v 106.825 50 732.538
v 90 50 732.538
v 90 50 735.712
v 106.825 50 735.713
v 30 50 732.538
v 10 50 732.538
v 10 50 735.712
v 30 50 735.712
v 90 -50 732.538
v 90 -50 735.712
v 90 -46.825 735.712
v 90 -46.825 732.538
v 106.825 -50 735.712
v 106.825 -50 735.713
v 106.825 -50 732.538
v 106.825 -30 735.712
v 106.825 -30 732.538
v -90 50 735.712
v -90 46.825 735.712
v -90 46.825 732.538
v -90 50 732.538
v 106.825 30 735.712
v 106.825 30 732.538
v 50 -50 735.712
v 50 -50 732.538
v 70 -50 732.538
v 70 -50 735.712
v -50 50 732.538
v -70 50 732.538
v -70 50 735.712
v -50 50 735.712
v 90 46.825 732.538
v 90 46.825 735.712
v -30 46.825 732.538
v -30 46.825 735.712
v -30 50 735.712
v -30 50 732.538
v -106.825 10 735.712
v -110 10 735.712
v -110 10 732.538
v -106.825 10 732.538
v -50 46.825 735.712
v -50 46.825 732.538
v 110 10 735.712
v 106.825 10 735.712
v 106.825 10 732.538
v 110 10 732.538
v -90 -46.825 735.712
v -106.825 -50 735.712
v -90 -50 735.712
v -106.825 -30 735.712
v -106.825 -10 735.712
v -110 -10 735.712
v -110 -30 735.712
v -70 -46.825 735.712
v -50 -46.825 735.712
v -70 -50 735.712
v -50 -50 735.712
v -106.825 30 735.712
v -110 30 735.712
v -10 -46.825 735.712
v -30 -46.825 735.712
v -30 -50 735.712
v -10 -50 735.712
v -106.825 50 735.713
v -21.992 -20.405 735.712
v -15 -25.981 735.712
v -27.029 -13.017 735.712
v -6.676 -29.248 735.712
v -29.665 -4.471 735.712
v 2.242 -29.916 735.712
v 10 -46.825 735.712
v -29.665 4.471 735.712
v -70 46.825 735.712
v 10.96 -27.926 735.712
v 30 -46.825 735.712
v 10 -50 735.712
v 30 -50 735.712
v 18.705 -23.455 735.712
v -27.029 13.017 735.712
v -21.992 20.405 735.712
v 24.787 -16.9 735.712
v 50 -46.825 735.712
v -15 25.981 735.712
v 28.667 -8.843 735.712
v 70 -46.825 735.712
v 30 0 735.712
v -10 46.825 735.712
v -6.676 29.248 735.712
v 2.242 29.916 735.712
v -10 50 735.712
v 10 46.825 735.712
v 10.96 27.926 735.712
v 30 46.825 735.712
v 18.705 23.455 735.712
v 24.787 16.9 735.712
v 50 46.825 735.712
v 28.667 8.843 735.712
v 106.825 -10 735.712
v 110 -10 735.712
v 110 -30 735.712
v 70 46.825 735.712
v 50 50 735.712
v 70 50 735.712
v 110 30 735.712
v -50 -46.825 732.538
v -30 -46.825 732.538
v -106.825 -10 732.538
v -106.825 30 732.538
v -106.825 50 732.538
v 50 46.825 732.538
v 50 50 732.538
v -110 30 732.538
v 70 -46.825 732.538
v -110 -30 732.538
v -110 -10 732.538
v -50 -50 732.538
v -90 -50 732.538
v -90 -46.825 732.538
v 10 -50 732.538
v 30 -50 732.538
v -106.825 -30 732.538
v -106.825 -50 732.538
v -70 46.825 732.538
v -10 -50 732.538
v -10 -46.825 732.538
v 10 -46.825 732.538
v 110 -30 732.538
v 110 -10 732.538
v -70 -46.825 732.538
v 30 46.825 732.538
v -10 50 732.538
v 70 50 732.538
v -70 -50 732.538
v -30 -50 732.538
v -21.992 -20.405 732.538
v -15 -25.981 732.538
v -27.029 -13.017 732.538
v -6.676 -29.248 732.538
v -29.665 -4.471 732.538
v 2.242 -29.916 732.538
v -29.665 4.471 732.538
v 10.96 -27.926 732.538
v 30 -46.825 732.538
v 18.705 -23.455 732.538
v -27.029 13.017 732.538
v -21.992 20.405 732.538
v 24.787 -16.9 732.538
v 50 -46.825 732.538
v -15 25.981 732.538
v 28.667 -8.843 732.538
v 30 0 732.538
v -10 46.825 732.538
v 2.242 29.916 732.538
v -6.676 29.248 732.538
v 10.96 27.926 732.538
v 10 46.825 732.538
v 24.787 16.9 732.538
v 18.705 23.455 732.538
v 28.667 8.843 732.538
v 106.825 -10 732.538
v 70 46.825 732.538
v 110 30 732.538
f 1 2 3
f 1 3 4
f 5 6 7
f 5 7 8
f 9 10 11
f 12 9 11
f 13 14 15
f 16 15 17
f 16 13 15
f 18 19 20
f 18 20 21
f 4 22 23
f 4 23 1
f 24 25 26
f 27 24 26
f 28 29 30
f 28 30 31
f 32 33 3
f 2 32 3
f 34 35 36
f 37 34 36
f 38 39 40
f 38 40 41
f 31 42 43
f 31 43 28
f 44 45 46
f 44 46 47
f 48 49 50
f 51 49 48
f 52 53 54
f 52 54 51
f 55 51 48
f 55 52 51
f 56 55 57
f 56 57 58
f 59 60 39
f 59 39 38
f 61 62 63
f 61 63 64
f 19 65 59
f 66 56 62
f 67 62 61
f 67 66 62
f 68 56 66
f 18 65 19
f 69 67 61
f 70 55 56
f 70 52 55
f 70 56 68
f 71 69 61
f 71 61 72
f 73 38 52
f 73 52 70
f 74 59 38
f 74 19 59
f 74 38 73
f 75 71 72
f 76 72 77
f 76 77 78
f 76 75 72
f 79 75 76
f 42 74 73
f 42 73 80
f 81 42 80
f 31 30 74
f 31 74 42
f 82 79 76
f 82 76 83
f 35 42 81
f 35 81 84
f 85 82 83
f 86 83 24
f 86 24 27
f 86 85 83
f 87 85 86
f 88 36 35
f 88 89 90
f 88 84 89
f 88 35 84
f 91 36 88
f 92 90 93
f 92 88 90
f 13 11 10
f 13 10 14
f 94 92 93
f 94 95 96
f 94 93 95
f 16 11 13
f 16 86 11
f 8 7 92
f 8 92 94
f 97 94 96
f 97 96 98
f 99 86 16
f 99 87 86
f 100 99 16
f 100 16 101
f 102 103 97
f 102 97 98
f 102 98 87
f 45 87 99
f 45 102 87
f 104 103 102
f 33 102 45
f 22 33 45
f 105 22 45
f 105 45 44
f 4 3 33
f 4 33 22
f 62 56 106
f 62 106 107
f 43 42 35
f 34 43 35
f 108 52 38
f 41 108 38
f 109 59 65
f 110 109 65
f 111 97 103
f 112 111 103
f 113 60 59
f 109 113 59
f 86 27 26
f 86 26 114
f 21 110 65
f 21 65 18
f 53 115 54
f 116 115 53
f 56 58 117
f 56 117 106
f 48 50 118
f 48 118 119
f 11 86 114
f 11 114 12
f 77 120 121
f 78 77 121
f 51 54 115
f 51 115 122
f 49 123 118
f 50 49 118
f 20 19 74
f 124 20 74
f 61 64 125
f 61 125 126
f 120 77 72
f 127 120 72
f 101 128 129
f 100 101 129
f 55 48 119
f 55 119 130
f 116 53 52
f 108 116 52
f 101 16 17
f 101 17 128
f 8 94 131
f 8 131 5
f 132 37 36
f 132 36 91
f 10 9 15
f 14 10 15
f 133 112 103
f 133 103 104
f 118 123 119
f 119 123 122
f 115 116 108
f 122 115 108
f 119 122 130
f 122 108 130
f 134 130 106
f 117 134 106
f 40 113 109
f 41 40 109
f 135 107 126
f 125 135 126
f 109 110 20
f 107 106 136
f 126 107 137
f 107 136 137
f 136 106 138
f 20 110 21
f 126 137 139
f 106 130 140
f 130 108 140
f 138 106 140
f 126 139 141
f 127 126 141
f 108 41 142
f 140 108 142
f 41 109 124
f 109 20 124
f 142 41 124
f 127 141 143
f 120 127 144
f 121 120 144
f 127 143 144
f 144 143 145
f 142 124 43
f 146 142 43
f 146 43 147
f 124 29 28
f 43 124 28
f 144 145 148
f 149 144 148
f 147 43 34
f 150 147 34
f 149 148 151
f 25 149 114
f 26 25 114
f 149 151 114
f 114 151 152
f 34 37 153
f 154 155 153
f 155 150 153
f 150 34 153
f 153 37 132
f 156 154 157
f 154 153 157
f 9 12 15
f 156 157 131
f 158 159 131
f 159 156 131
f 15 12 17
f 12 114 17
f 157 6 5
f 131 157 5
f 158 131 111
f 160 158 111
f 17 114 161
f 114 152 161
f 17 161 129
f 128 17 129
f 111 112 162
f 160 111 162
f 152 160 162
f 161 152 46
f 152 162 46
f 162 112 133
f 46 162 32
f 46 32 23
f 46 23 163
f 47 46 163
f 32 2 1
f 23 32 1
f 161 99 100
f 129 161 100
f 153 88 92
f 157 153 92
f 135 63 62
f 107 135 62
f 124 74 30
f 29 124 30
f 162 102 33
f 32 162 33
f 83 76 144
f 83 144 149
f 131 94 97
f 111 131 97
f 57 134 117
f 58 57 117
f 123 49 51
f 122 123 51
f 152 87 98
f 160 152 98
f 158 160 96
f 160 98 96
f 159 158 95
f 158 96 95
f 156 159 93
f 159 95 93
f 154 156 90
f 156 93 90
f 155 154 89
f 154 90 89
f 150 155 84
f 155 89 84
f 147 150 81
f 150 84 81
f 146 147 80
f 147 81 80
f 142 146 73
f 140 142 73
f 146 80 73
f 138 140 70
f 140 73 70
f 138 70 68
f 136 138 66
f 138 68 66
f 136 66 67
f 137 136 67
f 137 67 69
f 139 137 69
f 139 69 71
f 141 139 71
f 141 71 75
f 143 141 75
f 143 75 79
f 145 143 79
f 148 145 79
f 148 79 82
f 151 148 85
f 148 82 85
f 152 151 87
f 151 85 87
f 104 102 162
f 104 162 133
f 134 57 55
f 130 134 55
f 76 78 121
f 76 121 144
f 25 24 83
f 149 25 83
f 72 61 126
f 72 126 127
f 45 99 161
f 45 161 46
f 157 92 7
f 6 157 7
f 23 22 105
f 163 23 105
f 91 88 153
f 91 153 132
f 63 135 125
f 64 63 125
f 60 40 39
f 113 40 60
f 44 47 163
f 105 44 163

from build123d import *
from OCP.BRepAlgoAPI import BRepAlgoAPI_Cut
from OCP.TopTools import TopTools_ListOfShape

# Parameters (mm, degrees)
SKETCH1_W           = 2200
SKETCH1_H           = 1000
BOSS_EXTRUDE1_DEPTH = 750
SHELL1_T            = -31.75
SCALE1_SCALE        = 0.1
SKETCH36_W          = 3.1749958
SKETCH36_H          = 20.000053956
SKETCH36_W_2        = 3.175
SKETCH36_H_2        = 20
SKETCH36_W_3        = 20
SKETCH36_H_3        = 3.17496467
SKETCH36_H_4        = 3.17503533
CUT_EXTRUDE18_DEPTH = 3.175
SKETCH37_R          = 30
CUT_EXTRUDE19_DEPTH = 3.175
SKETCH38_W          = 3.331279269
SKETCH38_H          = 0.686362951
CUT_EXTRUDE20_DEPTH = 3.175


with BuildPart() as part:
    # Sketch1 → Boss-Extrude1 (new body)
    with BuildSketch(Plane.XY):
        Rectangle(SKETCH1_W, SKETCH1_H)
    extrude(amount=BOSS_EXTRUDE1_DEPTH)

    # Shell1
    shell1_openings = [part.faces().sort_by_distance(p)[0] for p in [
        (0, -500, 375),
        (-1100, 0, 375),
        (0, 500, 375),
        (1100, 0, 375),
        (0, 0, 0),
    ]]
    offset(amount=SHELL1_T, openings=shell1_openings, kind=Kind.INTERSECTION)


with BuildPart() as part_1:
    # Scale1: scaled about (0, 0, 734.125)
    add(part.part.scale(SCALE1_SCALE).moved(Location((0, 0, 660.7125))))


with BuildPart() as cut_extrude18_tool:
    # Sketch36 → Cut-Extrude18 (new body)
    with BuildSketch(Plane.XY.offset(735.7125)):
        with Locations((-108.4125021, 2.6978e-05)):
            Rectangle(SKETCH36_W, SKETCH36_H)
        with Locations((108.4124958, -39.999946044)):
            Rectangle(SKETCH36_W_2, SKETCH36_H_2)
        with Locations((108.4124958, 5.3956e-05)):
            Rectangle(SKETCH36_W_2, SKETCH36_H_2)
        with Locations((108.4124958, 40.000053956)):
            Rectangle(SKETCH36_W_2, SKETCH36_H_2)
        with Locations((-108.4125021, -39.999973022)):
            Rectangle(SKETCH36_W, SKETCH36_H)
        with Locations((-108.4125021, 40.000026978)):
            Rectangle(SKETCH36_W, SKETCH36_H)
        with Locations((39.9999958, 48.412517665)):
            Rectangle(SKETCH36_W_3, SKETCH36_H_3)
        with Locations((79.9999958, 48.412517665)):
            Rectangle(SKETCH36_W_3, SKETCH36_H_3)
        with Locations((-4.2e-06, 48.412517665)):
            Rectangle(SKETCH36_W_3, SKETCH36_H_3)
        with Locations((-40.0000042, 48.412517665)):
            Rectangle(SKETCH36_W_3, SKETCH36_H_3)
        with Locations((-80.0000042, 48.412517665)):
            Rectangle(SKETCH36_W_3, SKETCH36_H_3)
        with Locations((39.9999958, -48.412482335)):
            Rectangle(SKETCH36_W_3, SKETCH36_H_4)
        with Locations((79.9999958, -48.412482335)):
            Rectangle(SKETCH36_W_3, SKETCH36_H_4)
        with Locations((-4.2e-06, -48.412482335)):
            Rectangle(SKETCH36_W_3, SKETCH36_H_4)
        with Locations((-40.0000042, -48.412482335)):
            Rectangle(SKETCH36_W_3, SKETCH36_H_4)
        with Locations((-80.0000042, -48.412482335)):
            Rectangle(SKETCH36_W_3, SKETCH36_H_4)
    extrude(amount=-CUT_EXTRUDE18_DEPTH)


with BuildPart() as part_2:
    add(part_1.part)

    # Cut-Extrude18: cut by cut_extrude18_tool, with a tolerance
    cut_extrude18_stock = TopTools_ListOfShape()
    cut_extrude18_stock.Append(part_2.part.wrapped)
    cut_extrude18_tools = TopTools_ListOfShape()
    cut_extrude18_tools.Append(cut_extrude18_tool.part.wrapped)
    cut_extrude18_cut = BRepAlgoAPI_Cut()
    cut_extrude18_cut.SetArguments(cut_extrude18_stock)
    cut_extrude18_cut.SetTools(cut_extrude18_tools)
    cut_extrude18_cut.SetFuzzyValue(0.00001)
    cut_extrude18_cut.Build()
    add(Compound.cast(cut_extrude18_cut.Shape()).solids(), mode=Mode.REPLACE)

    # Sketch37 → Cut-Extrude19 (cut)
    with BuildSketch(Plane.XY.offset(735.7125)):
        Circle(SKETCH37_R)
    extrude(amount=-CUT_EXTRUDE19_DEPTH, mode=Mode.SUBTRACT)

    # Sketch38 → Cut-Extrude20 (cut)
    with BuildSketch(Plane.XY.offset(735.7125)):
        with Locations((108.490635435, -49.938595097)):
            Rectangle(SKETCH38_W, SKETCH38_H)
    extrude(amount=-CUT_EXTRUDE20_DEPTH, mode=Mode.SUBTRACT)


solid = part_2.part
